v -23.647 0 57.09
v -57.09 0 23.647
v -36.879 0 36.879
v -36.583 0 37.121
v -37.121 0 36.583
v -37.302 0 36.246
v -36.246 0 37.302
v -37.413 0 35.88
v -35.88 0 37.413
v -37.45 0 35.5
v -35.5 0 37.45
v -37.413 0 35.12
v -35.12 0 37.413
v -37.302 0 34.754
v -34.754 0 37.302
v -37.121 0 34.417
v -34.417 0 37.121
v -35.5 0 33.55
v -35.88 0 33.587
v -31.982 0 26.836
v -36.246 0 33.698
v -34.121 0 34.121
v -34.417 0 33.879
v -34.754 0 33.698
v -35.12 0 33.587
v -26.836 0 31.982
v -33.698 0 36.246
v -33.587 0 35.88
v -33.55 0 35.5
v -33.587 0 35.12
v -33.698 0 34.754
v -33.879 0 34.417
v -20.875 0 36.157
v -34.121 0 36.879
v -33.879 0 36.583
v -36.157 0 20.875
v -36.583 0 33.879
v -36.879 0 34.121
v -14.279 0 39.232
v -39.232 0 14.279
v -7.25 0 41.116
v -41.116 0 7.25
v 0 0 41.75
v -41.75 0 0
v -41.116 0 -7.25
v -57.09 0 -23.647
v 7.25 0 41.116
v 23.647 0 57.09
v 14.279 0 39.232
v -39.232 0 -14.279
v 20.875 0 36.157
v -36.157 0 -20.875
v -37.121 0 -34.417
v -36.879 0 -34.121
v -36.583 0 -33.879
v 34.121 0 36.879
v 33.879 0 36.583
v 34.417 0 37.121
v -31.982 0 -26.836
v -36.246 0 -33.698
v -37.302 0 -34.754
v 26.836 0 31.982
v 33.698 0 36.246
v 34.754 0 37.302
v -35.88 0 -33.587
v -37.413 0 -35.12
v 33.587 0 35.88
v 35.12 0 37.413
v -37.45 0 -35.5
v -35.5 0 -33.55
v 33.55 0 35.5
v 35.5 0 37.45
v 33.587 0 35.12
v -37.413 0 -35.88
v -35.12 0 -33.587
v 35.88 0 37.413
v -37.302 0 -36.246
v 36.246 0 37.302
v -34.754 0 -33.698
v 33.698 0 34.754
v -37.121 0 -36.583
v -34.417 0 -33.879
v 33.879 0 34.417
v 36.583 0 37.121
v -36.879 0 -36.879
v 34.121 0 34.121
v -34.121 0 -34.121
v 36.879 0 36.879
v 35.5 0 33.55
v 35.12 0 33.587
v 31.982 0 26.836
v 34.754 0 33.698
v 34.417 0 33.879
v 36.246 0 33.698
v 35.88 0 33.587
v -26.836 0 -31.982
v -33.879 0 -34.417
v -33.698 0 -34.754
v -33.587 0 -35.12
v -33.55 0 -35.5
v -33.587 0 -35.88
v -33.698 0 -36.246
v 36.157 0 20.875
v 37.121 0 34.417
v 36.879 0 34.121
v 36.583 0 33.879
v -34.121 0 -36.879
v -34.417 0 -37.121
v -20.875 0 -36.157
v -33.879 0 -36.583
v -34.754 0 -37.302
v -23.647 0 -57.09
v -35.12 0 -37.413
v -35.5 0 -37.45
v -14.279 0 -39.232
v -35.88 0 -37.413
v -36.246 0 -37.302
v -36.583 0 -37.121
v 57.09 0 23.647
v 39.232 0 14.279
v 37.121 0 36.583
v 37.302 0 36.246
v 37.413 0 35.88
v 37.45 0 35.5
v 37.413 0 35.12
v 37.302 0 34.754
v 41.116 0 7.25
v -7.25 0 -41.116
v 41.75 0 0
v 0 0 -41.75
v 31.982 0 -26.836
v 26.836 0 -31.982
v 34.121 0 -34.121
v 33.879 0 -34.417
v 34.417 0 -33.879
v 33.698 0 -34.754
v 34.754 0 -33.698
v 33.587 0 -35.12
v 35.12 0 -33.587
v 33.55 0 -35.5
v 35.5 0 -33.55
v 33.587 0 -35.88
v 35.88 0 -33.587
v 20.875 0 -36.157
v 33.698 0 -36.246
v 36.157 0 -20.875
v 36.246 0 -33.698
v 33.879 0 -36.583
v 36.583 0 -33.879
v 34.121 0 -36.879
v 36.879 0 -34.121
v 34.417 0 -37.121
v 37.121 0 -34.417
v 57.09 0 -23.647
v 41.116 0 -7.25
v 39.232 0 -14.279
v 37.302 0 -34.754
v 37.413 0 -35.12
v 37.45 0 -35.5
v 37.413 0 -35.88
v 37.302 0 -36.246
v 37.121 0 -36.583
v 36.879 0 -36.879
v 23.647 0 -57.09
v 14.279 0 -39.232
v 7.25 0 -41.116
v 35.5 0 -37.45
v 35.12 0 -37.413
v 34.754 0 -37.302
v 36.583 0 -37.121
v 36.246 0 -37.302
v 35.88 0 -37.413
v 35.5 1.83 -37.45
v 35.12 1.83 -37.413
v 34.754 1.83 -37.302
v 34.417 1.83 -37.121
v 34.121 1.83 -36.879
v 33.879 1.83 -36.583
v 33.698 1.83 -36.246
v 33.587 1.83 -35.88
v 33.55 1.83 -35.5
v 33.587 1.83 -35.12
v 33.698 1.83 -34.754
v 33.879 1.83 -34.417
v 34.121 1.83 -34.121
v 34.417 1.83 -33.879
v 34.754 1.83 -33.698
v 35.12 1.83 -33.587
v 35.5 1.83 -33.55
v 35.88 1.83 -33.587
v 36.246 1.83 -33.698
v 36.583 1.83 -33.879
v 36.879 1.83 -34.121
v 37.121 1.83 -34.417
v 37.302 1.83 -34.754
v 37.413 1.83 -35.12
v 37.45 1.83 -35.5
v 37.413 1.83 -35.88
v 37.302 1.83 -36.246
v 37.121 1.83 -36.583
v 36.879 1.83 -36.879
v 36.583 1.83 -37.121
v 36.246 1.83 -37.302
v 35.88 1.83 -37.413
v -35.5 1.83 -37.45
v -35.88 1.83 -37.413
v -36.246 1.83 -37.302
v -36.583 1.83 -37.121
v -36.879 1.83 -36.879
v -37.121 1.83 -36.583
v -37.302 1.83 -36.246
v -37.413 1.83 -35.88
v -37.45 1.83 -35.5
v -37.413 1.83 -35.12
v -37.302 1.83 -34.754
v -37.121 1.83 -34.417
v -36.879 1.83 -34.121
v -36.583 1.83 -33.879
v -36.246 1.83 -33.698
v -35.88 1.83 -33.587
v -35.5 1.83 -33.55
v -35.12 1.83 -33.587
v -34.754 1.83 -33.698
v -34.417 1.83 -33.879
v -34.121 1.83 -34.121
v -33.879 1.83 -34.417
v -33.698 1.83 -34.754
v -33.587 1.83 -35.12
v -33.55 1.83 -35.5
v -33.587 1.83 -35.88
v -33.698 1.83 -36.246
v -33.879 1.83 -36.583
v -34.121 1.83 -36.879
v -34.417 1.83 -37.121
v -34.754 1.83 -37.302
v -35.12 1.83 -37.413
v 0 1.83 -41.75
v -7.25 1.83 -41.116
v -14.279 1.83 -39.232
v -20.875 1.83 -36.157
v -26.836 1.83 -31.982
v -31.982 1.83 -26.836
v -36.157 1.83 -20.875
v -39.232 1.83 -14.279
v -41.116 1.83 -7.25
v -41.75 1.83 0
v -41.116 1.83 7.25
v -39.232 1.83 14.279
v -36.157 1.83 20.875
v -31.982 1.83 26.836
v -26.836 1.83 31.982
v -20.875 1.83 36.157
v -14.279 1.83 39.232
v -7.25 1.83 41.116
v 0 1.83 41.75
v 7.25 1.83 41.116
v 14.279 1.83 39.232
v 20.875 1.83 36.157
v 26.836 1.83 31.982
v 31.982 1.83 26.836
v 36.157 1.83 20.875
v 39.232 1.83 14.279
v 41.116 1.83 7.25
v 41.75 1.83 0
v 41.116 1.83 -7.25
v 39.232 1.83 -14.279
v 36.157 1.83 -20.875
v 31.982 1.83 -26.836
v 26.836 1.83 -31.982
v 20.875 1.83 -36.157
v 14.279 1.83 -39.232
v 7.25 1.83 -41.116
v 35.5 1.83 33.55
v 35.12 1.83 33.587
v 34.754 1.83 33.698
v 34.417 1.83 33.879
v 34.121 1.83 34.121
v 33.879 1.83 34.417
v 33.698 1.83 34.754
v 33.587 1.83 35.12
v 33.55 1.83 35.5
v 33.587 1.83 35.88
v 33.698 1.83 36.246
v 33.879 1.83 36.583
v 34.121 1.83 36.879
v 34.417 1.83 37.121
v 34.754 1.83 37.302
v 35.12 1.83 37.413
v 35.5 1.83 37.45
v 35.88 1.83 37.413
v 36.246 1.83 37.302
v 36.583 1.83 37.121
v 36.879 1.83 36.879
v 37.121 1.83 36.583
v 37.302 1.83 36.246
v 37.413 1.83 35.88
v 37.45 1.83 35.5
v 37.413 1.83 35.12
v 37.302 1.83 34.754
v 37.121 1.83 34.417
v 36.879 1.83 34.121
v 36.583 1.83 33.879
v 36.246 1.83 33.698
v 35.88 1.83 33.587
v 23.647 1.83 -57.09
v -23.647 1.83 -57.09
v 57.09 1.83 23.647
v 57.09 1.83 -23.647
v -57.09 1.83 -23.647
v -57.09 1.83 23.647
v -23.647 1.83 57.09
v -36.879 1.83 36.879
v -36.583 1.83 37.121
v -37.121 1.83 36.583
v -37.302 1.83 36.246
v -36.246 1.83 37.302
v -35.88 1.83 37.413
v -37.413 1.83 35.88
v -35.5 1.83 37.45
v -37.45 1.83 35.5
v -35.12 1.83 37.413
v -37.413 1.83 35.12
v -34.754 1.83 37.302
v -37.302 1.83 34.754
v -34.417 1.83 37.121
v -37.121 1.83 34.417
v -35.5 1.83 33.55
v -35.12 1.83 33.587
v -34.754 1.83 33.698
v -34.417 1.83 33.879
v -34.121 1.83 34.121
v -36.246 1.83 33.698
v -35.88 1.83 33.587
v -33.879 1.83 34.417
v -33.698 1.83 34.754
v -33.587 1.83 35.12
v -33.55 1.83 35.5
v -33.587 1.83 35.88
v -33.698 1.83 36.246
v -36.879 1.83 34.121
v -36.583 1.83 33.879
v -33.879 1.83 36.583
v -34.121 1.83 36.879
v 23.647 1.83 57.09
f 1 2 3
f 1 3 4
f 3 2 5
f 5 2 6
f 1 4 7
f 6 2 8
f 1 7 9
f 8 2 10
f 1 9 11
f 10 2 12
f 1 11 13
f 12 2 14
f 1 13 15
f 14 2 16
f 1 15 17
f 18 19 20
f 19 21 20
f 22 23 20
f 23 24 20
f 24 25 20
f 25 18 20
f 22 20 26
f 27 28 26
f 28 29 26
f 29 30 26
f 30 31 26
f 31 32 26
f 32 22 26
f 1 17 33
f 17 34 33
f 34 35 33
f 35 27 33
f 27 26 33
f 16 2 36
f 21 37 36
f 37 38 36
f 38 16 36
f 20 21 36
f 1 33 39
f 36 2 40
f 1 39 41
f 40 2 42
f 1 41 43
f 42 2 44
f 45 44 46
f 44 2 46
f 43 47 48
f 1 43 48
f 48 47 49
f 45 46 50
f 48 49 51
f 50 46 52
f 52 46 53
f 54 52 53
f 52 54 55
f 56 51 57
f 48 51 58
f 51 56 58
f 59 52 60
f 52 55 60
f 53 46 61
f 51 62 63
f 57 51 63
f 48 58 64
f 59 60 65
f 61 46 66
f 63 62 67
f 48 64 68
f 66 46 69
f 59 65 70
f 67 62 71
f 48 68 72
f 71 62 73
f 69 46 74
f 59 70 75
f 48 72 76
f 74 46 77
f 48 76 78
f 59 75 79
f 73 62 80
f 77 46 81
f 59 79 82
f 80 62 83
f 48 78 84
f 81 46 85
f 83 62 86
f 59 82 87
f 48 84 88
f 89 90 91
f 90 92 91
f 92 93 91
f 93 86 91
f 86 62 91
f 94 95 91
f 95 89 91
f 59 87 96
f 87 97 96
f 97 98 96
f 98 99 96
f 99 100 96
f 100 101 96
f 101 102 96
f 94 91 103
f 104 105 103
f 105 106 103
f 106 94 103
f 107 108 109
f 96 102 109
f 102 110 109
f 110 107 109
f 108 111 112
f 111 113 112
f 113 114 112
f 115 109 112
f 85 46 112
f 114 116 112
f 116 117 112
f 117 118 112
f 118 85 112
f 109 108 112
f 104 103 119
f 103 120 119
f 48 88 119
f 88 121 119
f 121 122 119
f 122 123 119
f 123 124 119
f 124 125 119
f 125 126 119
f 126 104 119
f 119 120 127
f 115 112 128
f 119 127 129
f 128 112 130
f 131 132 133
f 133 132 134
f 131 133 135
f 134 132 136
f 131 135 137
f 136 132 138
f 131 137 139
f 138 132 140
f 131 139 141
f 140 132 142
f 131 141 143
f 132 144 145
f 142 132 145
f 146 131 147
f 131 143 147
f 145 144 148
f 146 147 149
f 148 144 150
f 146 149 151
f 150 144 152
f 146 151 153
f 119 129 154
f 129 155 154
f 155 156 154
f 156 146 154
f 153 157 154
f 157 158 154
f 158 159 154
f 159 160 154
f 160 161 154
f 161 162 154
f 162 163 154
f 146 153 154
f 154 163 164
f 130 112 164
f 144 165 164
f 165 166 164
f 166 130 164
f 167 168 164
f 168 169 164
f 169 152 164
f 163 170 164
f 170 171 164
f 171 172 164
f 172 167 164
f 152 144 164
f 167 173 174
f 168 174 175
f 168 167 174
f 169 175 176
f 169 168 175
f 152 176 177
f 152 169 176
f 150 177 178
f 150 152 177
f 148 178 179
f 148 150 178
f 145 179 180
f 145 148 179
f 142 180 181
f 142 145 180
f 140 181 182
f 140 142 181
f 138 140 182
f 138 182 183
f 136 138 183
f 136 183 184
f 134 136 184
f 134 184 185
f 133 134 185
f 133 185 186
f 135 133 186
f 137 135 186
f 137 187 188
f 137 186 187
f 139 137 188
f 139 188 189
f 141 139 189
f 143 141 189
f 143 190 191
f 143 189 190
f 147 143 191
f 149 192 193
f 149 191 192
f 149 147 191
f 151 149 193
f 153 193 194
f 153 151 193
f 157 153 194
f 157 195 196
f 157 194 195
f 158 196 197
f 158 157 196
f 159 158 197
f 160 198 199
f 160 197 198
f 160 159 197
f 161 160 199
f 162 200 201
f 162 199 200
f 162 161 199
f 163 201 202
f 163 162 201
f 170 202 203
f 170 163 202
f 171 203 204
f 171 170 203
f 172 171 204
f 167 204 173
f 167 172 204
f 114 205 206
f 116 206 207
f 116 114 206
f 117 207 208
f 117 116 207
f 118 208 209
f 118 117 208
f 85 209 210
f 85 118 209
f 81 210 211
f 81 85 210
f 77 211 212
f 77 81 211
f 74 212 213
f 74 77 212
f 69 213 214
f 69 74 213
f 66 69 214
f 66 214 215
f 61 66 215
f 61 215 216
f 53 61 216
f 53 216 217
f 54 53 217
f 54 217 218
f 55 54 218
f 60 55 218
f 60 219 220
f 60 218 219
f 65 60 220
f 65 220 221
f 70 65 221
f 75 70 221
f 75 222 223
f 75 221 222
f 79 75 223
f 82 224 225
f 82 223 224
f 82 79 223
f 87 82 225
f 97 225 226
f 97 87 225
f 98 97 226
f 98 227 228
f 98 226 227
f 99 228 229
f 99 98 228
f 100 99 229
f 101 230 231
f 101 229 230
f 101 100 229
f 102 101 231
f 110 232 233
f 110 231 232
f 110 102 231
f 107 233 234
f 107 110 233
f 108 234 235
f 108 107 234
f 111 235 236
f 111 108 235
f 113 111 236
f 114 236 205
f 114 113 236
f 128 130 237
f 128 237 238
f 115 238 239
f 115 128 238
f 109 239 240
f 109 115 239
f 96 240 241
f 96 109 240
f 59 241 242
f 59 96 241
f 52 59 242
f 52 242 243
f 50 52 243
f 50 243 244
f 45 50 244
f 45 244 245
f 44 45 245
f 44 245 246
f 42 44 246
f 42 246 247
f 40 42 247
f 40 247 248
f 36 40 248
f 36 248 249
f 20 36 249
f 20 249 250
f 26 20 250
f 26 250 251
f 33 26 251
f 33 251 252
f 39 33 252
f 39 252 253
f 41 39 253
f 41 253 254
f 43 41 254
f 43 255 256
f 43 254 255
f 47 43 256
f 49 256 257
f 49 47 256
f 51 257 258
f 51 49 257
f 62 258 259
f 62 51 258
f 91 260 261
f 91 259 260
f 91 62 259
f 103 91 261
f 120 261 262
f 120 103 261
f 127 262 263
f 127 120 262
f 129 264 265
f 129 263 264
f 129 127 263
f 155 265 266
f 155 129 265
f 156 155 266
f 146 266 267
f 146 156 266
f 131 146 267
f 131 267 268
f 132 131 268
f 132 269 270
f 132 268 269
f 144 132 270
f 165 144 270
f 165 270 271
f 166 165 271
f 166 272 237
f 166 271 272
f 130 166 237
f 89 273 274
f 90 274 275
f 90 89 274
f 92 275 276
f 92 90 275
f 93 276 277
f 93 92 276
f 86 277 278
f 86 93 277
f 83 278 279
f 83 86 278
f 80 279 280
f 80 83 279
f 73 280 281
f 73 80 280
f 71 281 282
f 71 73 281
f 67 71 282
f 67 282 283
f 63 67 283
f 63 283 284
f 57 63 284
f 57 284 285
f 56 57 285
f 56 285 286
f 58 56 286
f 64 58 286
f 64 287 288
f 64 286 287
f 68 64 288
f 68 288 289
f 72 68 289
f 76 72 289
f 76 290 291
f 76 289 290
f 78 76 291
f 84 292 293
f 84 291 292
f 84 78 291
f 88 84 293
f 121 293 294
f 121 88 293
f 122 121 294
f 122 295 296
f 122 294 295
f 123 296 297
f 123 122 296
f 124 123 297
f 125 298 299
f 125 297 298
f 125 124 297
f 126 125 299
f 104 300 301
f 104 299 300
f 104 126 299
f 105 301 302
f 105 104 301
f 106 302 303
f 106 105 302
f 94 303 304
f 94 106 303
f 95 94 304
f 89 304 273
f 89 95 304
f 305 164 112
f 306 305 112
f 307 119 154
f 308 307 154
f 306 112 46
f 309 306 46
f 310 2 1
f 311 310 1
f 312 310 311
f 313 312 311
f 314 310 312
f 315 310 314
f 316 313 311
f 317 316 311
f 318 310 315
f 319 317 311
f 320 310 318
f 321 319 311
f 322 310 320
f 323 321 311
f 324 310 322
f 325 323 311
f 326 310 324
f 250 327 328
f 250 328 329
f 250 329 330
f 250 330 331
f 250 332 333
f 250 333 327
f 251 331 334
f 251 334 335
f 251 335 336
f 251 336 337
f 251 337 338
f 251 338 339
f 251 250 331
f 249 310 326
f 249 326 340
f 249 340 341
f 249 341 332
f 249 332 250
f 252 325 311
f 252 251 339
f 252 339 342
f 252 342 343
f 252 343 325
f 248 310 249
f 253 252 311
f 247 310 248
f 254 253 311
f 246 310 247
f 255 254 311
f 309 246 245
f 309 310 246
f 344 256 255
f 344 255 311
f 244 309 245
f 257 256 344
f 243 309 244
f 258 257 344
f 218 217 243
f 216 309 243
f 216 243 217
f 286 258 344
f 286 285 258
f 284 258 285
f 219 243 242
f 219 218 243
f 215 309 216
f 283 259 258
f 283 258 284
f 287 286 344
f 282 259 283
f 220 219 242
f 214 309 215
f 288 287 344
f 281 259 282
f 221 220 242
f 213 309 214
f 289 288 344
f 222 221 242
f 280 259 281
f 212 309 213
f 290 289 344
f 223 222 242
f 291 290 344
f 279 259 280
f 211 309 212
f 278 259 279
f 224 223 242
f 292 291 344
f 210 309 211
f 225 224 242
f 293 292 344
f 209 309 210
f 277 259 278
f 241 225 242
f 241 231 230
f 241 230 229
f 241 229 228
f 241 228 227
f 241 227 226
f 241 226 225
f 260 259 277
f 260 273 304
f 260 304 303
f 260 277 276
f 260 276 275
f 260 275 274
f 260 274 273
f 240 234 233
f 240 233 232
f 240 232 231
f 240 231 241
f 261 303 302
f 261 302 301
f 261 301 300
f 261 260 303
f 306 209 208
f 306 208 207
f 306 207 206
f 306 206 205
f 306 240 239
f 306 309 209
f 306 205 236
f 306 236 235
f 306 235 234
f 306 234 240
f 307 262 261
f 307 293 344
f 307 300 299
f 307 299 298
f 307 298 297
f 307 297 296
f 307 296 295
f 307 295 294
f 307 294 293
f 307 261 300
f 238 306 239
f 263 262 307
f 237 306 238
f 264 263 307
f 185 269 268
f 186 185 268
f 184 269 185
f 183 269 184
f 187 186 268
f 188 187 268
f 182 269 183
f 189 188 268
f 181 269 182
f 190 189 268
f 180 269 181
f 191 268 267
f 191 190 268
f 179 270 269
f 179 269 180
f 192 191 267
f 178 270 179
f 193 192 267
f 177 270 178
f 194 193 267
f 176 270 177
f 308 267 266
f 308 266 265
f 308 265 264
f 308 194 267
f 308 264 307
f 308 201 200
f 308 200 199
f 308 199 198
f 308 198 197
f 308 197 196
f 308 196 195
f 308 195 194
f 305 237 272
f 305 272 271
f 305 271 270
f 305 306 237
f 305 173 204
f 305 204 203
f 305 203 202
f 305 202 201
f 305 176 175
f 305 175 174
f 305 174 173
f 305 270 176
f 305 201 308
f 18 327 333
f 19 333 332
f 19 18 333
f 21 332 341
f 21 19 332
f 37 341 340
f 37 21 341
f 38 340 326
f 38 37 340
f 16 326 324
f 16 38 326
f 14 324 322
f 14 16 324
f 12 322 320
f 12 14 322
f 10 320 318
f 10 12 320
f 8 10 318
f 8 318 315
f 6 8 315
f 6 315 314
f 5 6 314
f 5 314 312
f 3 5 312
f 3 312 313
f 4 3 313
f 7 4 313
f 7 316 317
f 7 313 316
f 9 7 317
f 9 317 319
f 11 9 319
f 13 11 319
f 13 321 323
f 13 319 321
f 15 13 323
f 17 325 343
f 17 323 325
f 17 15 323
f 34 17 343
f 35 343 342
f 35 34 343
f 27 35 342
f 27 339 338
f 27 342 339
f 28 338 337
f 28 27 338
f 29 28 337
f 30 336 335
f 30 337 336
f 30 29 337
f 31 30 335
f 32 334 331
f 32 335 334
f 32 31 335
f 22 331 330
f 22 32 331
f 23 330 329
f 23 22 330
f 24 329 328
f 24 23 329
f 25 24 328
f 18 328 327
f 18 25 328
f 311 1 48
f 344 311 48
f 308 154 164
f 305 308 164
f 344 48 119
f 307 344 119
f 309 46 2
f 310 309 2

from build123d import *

# Parameters (mm, degrees)
BOSS_EXTRUDE1_DEPTH = 1.83
SKETCH2_R           = 1.95
SKETCH2_R_2         = 41.75
CUT_EXTRUDE1_DEPTH  = 23.83


with BuildPart() as part:
    # Sketch1 → Boss-Extrude1 (new body)
    with BuildSketch(Plane(origin=(0, 0, 0), x_dir=(1, 0, 0), z_dir=(0, 1, 0))):
        Polygon((57.09, -23.647452276), (57.09, 23.647452276), (23.647452276, 57.09), (-23.647452276, 57.09), (-57.09, 23.647452276), (-57.09, -23.647452276), (-23.647452276, -57.09), (23.647452276, -57.09), align=None)
    extrude(amount=BOSS_EXTRUDE1_DEPTH)

    # Sketch2 → Cut-Extrude1 (cut)
    with BuildSketch(Plane(origin=(0, 0, 0), x_dir=(1, 0, 0), z_dir=(0, 1, 0))):
        with Locations(Location((-35.5, 35.5, 0), (0, 0, 90))):
            Circle(SKETCH2_R)
        with Locations(Location((35.5, 35.5, 0), (0, 0, 90))):
            Circle(SKETCH2_R)
        with Locations(Location((35.5, -35.5, 0), (0, 0, 90))):
            Circle(SKETCH2_R)
        with Locations(Location((-35.5, -35.5, 0), (0, 0, 90))):
            Circle(SKETCH2_R)
        with Locations(Location((0, 0, 0), (0, 0, 90))):
            Circle(SKETCH2_R_2)
    extrude(amount=CUT_EXTRUDE1_DEPTH, mode=Mode.SUBTRACT)


solid = part.part
